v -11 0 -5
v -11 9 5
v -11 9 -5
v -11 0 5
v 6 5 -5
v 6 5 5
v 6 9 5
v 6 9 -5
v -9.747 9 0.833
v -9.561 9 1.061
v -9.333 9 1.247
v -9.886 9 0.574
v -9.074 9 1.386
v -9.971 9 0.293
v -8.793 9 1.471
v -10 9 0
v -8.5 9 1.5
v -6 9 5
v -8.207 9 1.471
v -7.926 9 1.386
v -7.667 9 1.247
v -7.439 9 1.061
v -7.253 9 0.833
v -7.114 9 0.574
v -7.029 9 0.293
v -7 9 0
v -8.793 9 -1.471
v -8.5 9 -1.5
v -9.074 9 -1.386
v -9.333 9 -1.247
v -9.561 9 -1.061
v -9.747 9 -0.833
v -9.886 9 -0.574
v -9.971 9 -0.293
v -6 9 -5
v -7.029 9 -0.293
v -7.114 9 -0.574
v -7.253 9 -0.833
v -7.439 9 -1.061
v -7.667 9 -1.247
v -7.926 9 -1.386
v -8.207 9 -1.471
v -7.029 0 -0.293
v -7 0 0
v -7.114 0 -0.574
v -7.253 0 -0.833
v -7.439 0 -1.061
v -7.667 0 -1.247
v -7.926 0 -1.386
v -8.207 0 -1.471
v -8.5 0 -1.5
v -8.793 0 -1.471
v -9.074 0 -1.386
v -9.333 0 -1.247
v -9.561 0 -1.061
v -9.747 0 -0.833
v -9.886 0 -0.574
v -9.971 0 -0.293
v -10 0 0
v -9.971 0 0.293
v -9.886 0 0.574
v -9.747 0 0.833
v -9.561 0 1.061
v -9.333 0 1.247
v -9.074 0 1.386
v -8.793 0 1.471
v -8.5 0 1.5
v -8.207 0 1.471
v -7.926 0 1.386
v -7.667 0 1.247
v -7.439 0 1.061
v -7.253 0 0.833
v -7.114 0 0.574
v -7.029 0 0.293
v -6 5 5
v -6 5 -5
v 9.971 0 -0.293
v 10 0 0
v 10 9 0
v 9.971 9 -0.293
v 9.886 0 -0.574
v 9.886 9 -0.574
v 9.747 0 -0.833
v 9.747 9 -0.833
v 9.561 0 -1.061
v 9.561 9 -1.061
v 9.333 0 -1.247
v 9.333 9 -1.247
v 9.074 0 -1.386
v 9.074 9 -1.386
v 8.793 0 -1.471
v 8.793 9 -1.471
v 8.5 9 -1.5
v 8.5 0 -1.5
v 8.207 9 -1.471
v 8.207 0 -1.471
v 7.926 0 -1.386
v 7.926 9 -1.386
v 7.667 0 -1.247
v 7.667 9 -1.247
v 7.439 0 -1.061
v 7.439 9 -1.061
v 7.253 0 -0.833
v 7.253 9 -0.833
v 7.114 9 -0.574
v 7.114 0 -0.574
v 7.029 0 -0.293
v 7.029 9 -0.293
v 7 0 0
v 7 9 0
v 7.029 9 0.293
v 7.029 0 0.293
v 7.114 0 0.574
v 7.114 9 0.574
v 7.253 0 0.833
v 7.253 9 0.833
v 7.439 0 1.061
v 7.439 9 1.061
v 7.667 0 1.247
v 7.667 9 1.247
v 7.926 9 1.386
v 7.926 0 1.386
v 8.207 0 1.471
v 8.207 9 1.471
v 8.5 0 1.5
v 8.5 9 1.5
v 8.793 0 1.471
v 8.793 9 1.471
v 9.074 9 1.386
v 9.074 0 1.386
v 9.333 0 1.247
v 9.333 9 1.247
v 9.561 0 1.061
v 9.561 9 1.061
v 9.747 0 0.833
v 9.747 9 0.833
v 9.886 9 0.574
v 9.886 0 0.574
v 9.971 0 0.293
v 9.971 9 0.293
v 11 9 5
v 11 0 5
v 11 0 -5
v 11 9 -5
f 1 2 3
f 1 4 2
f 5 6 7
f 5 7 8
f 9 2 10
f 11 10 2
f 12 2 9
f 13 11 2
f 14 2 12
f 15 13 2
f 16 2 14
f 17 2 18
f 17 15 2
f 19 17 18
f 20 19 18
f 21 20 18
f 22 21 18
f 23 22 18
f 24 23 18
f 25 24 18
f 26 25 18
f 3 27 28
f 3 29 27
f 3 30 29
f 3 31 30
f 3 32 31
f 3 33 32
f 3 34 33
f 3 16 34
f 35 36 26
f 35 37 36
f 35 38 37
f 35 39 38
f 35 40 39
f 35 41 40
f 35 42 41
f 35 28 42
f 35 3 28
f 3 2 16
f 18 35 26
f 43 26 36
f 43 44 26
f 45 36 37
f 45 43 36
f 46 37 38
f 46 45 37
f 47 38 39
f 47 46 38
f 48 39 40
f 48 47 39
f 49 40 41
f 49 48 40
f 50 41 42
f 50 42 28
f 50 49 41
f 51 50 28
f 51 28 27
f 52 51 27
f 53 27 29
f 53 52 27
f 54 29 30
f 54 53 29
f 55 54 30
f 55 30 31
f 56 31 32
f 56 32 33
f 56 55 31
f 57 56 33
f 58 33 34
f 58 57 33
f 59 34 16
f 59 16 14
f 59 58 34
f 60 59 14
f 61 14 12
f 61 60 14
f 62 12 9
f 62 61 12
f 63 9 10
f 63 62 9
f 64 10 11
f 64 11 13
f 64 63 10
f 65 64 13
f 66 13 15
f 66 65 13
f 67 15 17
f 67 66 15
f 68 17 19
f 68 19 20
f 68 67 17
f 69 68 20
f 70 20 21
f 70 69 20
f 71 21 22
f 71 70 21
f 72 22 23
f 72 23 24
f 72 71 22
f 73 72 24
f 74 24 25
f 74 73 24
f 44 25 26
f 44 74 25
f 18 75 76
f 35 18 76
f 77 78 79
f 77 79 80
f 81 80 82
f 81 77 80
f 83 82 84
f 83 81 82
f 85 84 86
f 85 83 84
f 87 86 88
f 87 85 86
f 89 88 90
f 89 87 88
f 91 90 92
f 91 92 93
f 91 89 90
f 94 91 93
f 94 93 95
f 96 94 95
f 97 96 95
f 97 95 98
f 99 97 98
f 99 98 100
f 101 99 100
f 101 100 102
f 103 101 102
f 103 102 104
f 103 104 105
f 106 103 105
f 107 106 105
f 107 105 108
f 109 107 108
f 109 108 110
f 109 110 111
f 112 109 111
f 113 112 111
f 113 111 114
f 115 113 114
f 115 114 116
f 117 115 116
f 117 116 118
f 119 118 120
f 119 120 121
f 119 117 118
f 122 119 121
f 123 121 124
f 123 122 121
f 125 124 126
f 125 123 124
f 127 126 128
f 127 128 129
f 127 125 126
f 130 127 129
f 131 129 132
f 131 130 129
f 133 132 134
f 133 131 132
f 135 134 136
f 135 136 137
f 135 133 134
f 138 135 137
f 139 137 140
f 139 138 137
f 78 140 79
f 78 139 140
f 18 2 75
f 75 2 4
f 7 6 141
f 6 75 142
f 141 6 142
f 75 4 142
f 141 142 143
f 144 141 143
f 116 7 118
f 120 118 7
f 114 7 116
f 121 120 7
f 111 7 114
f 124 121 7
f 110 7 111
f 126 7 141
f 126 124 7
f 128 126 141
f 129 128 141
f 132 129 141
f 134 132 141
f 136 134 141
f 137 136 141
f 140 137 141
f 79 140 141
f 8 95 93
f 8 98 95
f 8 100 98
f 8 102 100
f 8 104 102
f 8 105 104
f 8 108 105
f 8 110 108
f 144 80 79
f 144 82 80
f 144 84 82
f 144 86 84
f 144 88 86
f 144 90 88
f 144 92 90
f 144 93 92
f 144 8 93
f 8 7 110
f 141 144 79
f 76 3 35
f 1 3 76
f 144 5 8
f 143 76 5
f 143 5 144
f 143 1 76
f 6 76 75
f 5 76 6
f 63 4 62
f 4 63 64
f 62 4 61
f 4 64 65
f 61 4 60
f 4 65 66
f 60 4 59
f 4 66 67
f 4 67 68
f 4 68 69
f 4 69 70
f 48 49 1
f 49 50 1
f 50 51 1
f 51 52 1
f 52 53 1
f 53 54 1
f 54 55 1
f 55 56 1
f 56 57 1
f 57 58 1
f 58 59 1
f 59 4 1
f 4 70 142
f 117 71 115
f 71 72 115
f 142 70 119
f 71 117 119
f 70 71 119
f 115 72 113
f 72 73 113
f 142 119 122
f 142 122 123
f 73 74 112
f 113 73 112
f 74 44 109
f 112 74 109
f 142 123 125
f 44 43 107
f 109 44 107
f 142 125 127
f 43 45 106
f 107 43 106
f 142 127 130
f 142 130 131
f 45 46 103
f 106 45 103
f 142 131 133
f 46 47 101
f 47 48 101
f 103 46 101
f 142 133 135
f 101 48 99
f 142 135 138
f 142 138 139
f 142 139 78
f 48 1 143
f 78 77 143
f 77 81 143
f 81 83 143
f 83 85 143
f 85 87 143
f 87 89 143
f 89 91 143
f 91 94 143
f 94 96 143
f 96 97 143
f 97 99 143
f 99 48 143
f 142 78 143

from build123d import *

# Parameters (mm, degrees)
SKETCH_1_W      = 22
SKETCH_1_H      = 10
SKETCH_1_R      = 1.5
EXTRUDE_1_DEPTH = 5
SKETCH_2_W      = 5
SKETCH_2_H      = 10
SKETCH_2_R      = 1.5
EXTRUDE_2_DEPTH = 4


with BuildPart() as part:
    # 草圖1 → 填料-伸長1 (new body)
    with BuildSketch(Plane(origin=(0, 0, 0), x_dir=(1, 0, 0), z_dir=(0, 1, 0))):
        Rectangle(SKETCH_1_W, SKETCH_1_H)
        with Locations((-8.5, 0)):
            Circle(SKETCH_1_R, mode=Mode.SUBTRACT)
        with Locations((8.5, 0)):
            Circle(SKETCH_1_R, mode=Mode.SUBTRACT)
    extrude(amount=EXTRUDE_1_DEPTH)

    # 草圖2 → 填料-伸長2 (add)
    with BuildSketch(Plane(origin=(0, 5, 0), x_dir=(1, 0, 0), z_dir=(0, 1, 0))):
        with Locations((-8.5, 0)):
            Rectangle(SKETCH_2_W, SKETCH_2_H)
        with Locations((-8.5, 0)):
            Circle(SKETCH_2_R, mode=Mode.SUBTRACT)
        with Locations((8.5, 0)):
            Rectangle(SKETCH_2_W, SKETCH_2_H)
        with Locations((8.5, 0)):
            Circle(SKETCH_2_R, mode=Mode.SUBTRACT)
    extrude(amount=EXTRUDE_2_DEPTH)


solid = part.part
